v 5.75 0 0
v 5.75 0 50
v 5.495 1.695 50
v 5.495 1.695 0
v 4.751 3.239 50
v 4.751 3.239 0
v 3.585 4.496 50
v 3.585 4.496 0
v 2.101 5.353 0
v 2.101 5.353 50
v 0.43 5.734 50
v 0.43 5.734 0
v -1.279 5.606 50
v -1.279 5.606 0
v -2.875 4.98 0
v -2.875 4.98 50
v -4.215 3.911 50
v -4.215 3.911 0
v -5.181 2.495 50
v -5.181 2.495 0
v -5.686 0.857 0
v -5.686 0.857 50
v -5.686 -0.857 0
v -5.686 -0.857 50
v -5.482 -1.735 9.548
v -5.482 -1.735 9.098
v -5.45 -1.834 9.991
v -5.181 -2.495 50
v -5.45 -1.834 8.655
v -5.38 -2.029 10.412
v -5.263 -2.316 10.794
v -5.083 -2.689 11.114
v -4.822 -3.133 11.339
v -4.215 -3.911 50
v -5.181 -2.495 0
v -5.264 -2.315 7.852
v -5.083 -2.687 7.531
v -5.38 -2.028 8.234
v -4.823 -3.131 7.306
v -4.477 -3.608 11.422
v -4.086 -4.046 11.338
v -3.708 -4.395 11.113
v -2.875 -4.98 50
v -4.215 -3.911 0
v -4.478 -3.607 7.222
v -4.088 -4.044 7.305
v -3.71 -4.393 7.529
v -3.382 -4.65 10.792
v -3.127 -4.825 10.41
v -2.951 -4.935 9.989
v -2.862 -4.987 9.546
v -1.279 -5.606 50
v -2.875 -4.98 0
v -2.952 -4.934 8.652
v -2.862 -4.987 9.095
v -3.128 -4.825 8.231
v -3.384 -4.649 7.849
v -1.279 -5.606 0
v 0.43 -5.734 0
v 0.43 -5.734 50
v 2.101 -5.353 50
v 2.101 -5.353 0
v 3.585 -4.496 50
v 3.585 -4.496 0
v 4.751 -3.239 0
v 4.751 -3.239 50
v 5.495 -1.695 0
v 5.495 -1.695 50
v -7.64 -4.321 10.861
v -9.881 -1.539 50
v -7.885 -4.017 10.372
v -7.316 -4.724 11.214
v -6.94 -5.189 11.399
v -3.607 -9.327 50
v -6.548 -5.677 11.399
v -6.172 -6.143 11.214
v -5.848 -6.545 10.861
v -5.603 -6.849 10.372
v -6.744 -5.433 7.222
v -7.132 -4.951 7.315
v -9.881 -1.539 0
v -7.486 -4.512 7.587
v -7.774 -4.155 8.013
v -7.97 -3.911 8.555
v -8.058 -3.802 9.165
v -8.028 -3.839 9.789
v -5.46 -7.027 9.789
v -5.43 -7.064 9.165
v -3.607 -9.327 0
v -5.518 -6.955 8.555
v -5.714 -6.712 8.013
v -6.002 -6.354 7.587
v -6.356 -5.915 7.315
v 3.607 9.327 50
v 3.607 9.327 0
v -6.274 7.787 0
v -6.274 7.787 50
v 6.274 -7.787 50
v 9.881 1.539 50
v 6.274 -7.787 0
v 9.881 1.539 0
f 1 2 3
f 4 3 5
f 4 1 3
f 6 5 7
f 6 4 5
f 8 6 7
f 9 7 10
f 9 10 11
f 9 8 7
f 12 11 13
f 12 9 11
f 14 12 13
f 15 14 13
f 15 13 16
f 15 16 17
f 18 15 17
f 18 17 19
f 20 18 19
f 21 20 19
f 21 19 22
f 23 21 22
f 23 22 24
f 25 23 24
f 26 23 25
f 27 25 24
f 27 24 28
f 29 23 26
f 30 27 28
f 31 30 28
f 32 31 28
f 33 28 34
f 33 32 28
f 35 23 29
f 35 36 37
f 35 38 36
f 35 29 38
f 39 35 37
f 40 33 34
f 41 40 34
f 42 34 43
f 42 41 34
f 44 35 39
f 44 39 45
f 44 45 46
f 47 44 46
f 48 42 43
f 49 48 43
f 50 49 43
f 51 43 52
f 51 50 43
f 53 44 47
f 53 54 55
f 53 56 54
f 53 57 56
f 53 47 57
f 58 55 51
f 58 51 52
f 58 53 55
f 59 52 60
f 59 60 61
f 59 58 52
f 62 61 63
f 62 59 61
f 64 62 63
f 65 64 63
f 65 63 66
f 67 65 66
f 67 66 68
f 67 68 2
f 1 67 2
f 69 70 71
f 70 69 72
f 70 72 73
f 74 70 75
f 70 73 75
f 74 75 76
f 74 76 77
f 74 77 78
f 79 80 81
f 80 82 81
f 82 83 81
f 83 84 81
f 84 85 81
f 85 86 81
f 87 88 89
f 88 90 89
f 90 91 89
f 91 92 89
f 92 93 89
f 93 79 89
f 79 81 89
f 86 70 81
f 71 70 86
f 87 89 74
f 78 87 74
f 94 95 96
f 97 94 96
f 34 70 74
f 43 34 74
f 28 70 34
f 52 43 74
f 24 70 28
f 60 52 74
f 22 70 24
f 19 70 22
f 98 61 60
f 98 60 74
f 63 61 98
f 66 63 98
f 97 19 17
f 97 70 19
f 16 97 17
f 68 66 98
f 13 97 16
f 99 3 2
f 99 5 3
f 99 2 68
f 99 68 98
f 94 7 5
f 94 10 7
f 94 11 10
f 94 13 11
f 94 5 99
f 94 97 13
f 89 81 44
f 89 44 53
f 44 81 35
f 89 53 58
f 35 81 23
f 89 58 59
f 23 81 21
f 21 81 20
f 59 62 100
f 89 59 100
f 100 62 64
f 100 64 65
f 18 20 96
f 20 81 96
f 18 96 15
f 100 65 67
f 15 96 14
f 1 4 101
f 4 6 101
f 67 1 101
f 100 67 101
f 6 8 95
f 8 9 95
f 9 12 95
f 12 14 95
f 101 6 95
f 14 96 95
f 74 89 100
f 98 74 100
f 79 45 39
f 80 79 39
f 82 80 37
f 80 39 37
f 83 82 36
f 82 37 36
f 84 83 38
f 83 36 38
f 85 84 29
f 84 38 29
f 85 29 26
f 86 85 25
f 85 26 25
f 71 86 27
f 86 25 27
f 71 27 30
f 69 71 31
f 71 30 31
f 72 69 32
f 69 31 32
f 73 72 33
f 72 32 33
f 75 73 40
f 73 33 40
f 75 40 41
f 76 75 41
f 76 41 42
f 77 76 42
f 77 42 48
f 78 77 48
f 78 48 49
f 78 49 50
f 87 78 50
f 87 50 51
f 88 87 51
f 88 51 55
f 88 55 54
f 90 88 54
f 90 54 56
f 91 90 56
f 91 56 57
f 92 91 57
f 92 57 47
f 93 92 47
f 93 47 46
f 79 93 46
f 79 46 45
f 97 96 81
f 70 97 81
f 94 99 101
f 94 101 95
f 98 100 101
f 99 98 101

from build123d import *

# Parameters (mm, degrees)
SKETCH_1_R             = 5.75
EXTRUDE_1_DEPTH        = 50
HOLE_WIZARD_M5_1_D     = 4.2
HOLE_WIZARD_M5_1_DEPTH = 12.4
HOLE_WIZARD_M5_1_TIP   = 1.2618073


with BuildPart() as part:
    # 草图1 → 凸台-拉伸1 (new body)
    with BuildSketch(Plane.XY):
        Polygon((6.273575685, -7.78731328), (9.88079897, 1.539419276), (3.607223285, 9.326732556), (-6.273575685, 7.78731328), (-9.88079897, -1.539419276), (-3.607223285, -9.326732556), align=None)
        Circle(SKETCH_1_R, mode=Mode.SUBTRACT)
    extrude(amount=EXTRUDE_1_DEPTH)

    # M5 螺纹孔1
    with Locations(Plane(origin=(-6.744011128, -5.433075916, 0), x_dir=(0, 0, 1), z_dir=(-0.7787313279896286, -0.6273575685424616, 0))):
        with Locations((9.322042098, 0)):
            Hole(HOLE_WIZARD_M5_1_D / 2, depth=HOLE_WIZARD_M5_1_DEPTH)
            with Locations((0, 0, -(HOLE_WIZARD_M5_1_DEPTH + HOLE_WIZARD_M5_1_TIP / 2))):  # 118° drill point
                Cone(0, HOLE_WIZARD_M5_1_D / 2, HOLE_WIZARD_M5_1_TIP, mode=Mode.SUBTRACT)


solid = part.part
